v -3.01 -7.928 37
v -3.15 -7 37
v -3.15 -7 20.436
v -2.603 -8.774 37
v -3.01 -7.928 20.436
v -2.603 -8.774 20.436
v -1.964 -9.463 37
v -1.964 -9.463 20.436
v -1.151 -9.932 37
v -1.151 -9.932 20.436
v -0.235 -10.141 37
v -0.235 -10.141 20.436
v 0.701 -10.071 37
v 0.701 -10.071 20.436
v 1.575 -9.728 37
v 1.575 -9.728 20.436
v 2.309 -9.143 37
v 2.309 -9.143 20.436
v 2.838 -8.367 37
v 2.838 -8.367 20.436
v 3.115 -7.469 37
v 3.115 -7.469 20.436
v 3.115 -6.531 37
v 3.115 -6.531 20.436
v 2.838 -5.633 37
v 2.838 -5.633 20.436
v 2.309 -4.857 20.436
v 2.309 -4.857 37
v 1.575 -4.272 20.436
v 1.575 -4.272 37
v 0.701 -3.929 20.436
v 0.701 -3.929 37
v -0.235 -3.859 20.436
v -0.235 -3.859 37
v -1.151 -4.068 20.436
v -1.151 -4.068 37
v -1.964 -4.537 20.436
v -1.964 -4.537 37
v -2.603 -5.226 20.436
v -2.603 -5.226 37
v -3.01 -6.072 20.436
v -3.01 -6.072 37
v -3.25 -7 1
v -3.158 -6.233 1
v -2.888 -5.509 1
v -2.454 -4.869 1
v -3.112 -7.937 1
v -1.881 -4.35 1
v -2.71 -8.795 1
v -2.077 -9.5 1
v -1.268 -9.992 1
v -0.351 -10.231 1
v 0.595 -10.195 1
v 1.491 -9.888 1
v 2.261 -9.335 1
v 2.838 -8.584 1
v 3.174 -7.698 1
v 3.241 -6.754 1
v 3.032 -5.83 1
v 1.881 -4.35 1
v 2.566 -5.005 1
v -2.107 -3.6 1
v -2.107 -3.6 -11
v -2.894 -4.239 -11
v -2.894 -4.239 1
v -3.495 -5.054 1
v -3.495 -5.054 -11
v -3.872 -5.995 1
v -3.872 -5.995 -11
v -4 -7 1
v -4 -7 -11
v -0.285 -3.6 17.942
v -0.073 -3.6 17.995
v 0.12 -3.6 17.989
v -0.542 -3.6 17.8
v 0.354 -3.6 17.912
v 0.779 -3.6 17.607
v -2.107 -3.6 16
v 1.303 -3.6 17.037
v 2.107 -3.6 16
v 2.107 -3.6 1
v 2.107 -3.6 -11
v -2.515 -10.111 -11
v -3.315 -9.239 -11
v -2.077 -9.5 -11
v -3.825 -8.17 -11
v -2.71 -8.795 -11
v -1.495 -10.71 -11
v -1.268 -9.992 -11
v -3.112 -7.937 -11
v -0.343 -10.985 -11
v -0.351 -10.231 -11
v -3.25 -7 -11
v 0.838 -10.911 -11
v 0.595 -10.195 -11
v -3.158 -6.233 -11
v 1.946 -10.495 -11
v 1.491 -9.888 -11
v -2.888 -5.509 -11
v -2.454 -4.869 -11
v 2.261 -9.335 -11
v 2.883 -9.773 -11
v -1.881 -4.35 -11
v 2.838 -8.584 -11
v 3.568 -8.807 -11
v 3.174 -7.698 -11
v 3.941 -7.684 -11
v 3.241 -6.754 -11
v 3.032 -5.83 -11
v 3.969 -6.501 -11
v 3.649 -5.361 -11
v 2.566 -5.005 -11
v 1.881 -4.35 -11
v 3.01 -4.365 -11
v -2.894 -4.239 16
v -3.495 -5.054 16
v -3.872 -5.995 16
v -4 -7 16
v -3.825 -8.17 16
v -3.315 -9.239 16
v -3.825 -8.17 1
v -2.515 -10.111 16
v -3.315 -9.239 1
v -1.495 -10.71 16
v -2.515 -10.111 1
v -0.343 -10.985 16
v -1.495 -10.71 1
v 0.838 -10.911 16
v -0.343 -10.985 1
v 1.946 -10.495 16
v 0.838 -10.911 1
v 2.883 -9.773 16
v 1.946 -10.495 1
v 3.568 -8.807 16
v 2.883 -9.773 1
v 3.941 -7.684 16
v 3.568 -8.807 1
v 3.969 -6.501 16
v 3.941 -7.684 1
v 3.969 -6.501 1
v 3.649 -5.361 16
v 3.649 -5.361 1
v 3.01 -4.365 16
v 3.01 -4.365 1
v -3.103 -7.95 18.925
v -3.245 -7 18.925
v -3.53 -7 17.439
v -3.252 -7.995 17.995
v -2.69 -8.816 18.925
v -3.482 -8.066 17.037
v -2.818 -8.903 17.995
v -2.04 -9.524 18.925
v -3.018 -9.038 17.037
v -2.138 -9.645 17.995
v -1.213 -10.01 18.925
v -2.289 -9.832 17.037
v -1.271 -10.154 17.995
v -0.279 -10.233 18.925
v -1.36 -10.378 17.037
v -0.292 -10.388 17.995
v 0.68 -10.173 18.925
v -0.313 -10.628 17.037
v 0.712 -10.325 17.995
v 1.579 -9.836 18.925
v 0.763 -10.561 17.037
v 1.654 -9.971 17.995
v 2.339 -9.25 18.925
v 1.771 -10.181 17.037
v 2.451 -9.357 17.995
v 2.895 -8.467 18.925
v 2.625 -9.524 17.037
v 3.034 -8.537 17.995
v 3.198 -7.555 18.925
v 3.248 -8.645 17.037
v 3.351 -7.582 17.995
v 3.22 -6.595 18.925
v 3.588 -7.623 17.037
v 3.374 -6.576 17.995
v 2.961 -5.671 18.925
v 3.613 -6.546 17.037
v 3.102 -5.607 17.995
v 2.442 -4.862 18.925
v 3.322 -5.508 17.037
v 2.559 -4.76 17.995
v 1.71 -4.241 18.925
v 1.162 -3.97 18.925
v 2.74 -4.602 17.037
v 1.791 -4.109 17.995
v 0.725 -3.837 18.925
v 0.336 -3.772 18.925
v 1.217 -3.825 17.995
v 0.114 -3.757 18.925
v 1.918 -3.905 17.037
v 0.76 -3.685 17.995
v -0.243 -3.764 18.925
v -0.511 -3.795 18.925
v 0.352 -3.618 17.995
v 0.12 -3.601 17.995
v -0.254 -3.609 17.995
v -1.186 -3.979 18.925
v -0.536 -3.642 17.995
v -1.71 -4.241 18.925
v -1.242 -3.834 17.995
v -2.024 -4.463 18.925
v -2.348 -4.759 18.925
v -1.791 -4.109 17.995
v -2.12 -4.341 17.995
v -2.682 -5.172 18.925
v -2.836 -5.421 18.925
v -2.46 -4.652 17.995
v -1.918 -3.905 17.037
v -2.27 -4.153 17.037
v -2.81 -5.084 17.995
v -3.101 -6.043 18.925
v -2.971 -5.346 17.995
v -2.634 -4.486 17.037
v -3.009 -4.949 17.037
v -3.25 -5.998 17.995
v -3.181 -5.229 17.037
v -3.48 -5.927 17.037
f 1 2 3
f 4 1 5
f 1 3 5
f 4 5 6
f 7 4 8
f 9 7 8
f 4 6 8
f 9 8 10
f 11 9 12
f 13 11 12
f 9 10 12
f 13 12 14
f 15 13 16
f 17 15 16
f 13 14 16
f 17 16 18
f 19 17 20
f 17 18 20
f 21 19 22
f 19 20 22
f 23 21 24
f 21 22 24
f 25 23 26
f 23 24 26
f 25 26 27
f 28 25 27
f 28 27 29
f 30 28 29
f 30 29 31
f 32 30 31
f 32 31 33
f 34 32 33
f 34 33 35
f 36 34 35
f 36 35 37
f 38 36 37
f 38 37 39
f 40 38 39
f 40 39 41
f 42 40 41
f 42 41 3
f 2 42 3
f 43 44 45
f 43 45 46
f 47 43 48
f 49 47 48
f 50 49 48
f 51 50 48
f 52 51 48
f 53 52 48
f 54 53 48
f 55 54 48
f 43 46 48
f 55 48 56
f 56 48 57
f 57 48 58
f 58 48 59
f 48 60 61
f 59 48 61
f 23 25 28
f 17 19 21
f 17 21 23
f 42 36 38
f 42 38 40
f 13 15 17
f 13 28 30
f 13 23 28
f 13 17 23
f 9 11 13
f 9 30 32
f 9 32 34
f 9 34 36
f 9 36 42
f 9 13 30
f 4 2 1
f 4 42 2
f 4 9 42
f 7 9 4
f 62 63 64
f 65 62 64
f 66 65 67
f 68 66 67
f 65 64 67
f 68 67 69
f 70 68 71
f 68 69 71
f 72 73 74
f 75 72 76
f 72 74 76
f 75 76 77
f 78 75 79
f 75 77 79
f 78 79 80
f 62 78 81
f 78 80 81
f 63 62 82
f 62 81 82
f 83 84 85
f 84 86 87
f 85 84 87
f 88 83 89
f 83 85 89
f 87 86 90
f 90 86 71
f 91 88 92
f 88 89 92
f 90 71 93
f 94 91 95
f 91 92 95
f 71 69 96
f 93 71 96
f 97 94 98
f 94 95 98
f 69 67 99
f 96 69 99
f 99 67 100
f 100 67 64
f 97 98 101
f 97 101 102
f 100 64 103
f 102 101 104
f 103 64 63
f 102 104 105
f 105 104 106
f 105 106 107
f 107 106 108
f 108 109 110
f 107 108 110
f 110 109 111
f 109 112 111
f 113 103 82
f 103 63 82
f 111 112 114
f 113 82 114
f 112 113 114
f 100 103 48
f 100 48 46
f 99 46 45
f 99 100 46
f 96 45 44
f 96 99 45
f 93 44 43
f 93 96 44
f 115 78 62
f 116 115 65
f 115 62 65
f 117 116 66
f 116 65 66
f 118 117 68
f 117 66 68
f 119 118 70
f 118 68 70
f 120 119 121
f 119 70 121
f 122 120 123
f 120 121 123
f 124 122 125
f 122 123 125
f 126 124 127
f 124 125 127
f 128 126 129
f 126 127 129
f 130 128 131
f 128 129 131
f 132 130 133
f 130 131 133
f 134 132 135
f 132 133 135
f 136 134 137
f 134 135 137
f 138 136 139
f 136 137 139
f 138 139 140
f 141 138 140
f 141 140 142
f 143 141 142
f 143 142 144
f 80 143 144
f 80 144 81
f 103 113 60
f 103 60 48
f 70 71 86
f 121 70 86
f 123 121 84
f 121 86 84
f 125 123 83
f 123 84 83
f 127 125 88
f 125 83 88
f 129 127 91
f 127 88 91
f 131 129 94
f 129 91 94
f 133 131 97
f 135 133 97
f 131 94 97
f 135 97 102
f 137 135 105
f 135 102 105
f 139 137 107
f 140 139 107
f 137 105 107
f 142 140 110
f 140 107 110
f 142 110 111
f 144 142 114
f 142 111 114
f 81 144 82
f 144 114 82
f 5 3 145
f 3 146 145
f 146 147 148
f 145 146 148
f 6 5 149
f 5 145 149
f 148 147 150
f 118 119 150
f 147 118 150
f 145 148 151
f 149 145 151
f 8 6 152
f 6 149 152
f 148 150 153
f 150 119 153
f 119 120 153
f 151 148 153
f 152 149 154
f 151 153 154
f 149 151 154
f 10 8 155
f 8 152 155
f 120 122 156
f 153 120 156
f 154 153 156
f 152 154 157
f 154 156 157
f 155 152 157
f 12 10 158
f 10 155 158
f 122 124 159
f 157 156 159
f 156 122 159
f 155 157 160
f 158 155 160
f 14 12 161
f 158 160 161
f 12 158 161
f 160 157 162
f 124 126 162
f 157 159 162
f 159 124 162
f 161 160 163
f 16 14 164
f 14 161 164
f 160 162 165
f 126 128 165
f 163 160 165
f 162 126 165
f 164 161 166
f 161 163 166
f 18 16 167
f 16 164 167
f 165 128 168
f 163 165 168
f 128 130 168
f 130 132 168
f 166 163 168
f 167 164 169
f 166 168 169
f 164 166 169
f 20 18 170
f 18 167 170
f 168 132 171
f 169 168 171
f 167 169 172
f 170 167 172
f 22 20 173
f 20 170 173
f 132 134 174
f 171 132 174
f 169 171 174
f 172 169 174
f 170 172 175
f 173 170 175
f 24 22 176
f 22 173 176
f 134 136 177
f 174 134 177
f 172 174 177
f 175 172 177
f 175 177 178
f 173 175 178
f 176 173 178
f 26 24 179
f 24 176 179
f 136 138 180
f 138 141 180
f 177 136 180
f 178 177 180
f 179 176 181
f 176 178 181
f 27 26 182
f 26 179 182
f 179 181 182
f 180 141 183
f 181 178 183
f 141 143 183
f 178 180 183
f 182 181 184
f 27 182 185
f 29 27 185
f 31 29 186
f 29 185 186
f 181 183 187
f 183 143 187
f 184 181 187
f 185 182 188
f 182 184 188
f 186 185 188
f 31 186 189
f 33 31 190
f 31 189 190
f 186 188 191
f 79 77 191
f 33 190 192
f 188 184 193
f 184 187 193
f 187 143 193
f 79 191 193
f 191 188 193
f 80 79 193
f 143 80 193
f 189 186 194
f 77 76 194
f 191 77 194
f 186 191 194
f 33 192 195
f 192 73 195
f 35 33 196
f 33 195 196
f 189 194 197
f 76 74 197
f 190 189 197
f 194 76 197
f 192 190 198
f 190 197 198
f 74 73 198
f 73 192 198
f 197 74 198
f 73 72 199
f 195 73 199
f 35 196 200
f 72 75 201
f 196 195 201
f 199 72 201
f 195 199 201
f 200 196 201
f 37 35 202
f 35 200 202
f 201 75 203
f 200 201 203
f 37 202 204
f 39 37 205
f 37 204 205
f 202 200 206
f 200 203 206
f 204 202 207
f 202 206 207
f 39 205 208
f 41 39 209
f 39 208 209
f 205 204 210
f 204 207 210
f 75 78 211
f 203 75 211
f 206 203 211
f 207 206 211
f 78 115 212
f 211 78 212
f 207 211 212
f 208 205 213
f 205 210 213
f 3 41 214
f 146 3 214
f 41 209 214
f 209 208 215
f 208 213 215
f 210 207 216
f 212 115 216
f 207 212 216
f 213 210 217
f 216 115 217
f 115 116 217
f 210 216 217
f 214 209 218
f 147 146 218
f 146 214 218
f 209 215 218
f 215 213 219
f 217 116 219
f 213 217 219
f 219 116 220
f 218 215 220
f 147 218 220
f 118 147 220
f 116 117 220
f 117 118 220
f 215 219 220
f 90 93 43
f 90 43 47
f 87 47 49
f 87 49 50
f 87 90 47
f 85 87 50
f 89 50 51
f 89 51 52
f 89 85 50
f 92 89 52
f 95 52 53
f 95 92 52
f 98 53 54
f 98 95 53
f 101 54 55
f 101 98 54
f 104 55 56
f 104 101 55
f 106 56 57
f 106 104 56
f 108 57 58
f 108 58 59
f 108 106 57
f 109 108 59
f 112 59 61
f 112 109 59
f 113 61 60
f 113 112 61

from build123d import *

# Parameters (mm, degrees)
BOSS_EXTRUDE1_DEPTH      = 1
BOSS_EXTRUDE1_DEPTH_BACK = 11
BOSS_EXTRUDE2_DEPTH      = 15
SKETCH3_R                = 3.15
BOSS_EXTRUDE3_DEPTH      = 21
FILLET1_R                = 12


with BuildPart() as part:
    # Sketch1 → Boss-Extrude1 (new, two sides: drawn at the far end of the back side and taken through both)
    with BuildSketch(Plane.XY.offset(-BOSS_EXTRUDE1_DEPTH_BACK)):
        with BuildLine():
            Line((2.107130751, -3.6), (-2.107130751, -3.6))
            ThreePointArc((-2.107130751, -3.6), (-3.494890771, -5.054302567), (-4, -7))
            ThreePointArc((-4, -7), (1.945697433, -10.494890771), (2.107130751, -3.6))
        make_face()
        with BuildLine():
            Line((1.881488772, -4.35), (-1.881488772, -4.35))
            ThreePointArc((-1.881488772, -4.35), (-2.887675407, -5.508748598), (-3.25, -7))
            ThreePointArc((-3.25, -7), (1.491251402, -9.887675407), (1.881488772, -4.35))
        make_face(mode=Mode.SUBTRACT)
    extrude(amount=BOSS_EXTRUDE1_DEPTH + BOSS_EXTRUDE1_DEPTH_BACK)

    # Sketch2 → Boss-Extrude2 (add)
    with BuildSketch(Plane.XY.offset(1)):
        with BuildLine():
            Line((2.107130751, -3.6), (-2.107130751, -3.6))
            ThreePointArc((-2.107130751, -3.6), (0, -11), (2.107130751, -3.6))
        make_face()
    extrude(amount=BOSS_EXTRUDE2_DEPTH)

    # Sketch3 → Boss-Extrude3 (add)
    with BuildSketch(Plane.XY.offset(16)):
        with Locations(Location((0, -7, 0), (0, 0, 180))):
            Circle(SKETCH3_R)
    extrude(amount=BOSS_EXTRUDE3_DEPTH)

    # Fillet1
    # the kernel refuses this fillet: 12 mm, written as the material it adds along each edge
    with BuildSketch(Plane(origin=(0, -7, 16), x_dir=(-1, 0, 0), z_dir=(0, 1, 0))) as fillet1_piece_1_section:
        with BuildLine():
            CenterArc((15.15, 4.435932822), FILLET1_R, 180, 21.694716022)
            Line((3.15, 4.435932822), (2.91, 4.435932822))
            Line((2.91, 4.435932822), (2.91, 0))
            Line((2.91, 0), (3.15, -0.24))
            ThreePointArc((3.15, -0.24), (3.575, -0.24), (3.777, -0.088718656))
            Line((3.777, -0.088718656), (4, 0))
        make_face()
    fillet1_piece_1 = revolve(axis=Axis((0, -7, 16), (0, 0, 1)), mode=Mode.PRIVATE)
    fillet1_piece_1 = split(fillet1_piece_1, bisect_by=Plane(origin=(3.32837519, -3.6, 18.170708912), z_dir=(0, -1, 0)), keep=Keep.TOP, mode=Mode.PRIVATE)
    add(fillet1_piece_1)


solid = part.part
